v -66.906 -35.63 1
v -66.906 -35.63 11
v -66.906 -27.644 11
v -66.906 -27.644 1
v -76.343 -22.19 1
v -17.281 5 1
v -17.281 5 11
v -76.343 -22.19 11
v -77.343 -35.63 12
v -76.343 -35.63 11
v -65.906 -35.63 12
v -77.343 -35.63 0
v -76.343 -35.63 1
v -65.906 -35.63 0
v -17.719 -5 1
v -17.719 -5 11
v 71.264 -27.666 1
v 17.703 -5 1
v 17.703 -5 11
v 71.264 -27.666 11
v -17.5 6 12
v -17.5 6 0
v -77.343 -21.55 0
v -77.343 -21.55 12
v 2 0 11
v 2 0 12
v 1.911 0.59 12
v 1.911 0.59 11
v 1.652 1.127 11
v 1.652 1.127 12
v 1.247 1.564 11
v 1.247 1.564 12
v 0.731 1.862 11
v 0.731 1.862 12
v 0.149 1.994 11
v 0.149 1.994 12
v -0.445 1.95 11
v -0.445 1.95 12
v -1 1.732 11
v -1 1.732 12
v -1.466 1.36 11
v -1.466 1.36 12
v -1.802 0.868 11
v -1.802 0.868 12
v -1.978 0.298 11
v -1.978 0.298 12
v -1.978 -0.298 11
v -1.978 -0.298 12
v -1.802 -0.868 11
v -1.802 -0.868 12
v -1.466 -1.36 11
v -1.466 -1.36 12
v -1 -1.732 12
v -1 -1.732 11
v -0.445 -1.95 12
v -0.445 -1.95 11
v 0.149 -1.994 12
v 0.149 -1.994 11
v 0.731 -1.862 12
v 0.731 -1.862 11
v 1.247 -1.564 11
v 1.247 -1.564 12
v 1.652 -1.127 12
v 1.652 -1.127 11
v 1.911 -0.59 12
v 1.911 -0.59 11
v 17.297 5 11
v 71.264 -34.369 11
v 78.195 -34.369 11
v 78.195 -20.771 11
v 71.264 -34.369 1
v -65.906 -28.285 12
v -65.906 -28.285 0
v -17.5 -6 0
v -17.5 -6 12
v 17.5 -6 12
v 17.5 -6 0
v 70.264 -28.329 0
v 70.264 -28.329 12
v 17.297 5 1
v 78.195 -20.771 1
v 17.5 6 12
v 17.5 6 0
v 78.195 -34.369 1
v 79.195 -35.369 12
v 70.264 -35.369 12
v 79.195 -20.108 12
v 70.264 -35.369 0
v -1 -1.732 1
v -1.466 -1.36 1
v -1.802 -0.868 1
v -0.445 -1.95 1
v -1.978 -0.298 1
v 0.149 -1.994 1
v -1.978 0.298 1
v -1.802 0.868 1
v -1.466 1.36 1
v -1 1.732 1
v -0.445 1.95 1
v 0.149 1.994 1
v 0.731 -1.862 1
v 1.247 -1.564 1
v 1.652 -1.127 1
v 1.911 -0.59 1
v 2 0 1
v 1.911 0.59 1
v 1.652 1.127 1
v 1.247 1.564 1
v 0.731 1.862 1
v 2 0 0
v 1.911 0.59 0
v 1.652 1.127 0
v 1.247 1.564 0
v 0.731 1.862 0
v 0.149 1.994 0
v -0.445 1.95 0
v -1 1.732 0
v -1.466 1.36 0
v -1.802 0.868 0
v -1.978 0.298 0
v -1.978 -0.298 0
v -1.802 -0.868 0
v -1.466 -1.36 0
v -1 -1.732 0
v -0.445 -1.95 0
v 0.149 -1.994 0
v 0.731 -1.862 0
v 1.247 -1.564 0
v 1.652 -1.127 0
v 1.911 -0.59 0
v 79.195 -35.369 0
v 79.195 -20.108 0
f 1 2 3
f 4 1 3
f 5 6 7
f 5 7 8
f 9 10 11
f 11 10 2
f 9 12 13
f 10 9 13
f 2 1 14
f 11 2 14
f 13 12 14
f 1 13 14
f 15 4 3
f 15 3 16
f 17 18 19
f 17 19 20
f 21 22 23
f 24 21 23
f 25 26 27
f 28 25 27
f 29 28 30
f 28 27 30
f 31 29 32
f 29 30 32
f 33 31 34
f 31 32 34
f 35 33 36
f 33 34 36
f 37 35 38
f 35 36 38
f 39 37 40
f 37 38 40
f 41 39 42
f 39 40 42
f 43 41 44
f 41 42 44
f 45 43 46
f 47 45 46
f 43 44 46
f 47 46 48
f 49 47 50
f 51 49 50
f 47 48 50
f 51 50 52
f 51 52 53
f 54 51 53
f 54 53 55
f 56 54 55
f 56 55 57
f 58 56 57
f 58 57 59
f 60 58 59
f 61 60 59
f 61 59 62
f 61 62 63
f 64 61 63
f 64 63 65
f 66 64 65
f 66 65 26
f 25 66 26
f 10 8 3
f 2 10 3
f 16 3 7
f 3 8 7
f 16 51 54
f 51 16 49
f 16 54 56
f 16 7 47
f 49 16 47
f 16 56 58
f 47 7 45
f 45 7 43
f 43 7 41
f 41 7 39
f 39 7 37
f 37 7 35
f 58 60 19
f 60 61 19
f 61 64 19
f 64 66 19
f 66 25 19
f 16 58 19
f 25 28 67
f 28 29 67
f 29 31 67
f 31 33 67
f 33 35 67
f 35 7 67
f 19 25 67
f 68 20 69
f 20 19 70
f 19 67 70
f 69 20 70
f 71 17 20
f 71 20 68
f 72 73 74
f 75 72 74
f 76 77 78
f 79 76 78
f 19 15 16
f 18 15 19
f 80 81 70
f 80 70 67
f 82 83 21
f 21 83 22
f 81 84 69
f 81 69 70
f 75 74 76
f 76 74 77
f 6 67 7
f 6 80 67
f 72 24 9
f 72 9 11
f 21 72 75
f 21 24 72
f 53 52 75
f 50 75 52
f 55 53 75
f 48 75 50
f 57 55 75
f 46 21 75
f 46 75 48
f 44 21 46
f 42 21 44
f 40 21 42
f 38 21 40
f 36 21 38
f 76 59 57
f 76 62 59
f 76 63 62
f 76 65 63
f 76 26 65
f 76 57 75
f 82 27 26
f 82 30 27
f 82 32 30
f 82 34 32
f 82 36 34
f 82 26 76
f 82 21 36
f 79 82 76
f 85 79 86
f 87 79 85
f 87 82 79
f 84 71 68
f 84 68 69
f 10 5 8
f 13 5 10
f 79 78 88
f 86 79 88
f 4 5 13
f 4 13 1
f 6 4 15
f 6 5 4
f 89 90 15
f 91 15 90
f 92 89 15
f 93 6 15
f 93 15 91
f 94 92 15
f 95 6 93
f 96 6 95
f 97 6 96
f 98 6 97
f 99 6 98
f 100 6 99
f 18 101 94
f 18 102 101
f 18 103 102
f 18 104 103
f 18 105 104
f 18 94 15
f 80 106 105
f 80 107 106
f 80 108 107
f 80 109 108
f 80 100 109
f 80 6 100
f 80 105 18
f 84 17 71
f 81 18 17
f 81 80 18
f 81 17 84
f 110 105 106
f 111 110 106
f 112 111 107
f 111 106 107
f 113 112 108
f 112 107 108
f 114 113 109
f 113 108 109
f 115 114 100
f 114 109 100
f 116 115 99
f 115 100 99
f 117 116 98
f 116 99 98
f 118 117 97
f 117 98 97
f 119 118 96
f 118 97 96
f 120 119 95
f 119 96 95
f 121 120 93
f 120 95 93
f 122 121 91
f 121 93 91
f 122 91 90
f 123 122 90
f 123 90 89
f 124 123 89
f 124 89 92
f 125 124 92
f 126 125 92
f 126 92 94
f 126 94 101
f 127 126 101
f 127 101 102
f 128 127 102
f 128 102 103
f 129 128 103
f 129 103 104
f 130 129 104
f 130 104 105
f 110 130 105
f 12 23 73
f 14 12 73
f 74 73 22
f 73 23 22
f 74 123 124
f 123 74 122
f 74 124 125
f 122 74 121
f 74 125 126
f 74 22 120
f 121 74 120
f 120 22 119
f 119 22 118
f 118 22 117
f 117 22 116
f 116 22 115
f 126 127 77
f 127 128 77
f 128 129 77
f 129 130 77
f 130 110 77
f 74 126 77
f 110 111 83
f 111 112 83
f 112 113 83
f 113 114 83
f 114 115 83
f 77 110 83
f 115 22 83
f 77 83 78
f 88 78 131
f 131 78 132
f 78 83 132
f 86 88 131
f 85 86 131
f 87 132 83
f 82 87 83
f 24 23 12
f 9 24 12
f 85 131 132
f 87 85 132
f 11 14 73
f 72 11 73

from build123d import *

# Parameters (mm, degrees)
BOSS_EXTRUDE1_DEPTH = 12
SHELL1_T            = -1
SKETCH2_W           = 10
SKETCH2_H           = 10
CUT_EXTRUDE1_DEPTH  = 12
SKETCH3_R           = 2
CUT_EXTRUDE2_DEPTH  = 12
SKETCH5_W           = 0.21800788
SKETCH5_H           = 12
CUT_EXTRUDE3_DEPTH  = 1.937482958


with BuildPart() as part:
    # Sketch1 → Boss-Extrude1 (new body)
    with BuildSketch(Plane.XY):
        Polygon((-17.5, 6), (-77.342905627, -21.549973615), (-77.342905627, -35.63), (-65.906288607, -35.63), (-65.906288607, -28.284880053), (-17.5, -6), (17.5, -6), (70.263903397, -28.328632203), (70.263903397, -35.368537604), (79.19497343, -35.368537604), (79.19497343, -20.108083023), (17.5, 6), align=None)
    extrude(amount=BOSS_EXTRUDE1_DEPTH)

    # Shell1
    shell1_openings = [part.faces().sort_by_distance(p)[0] for p in [
        (-71.624597117, -35.63, 6),
    ]]
    offset(amount=SHELL1_T, openings=shell1_openings, kind=Kind.INTERSECTION)

    # Sketch2 → Cut-Extrude1 (cut)
    with BuildSketch(Plane.XZ.offset(35.63)):
        with Locations((89.157094373, 6.101364163)):
            Rectangle(SKETCH2_W, SKETCH2_H)
    extrude(amount=-CUT_EXTRUDE1_DEPTH, mode=Mode.SUBTRACT)

    # Sketch3 → Cut-Extrude2 (cut)
    with BuildSketch(Plane.XY.offset(12)):
        Circle(SKETCH3_R)
    extrude(amount=-CUT_EXTRUDE2_DEPTH, mode=Mode.SUBTRACT)

    # Sketch5 → Cut-Extrude3 (cut)
    with BuildSketch(Plane.XZ.offset(35.63)):
        with Locations((83.048090433, 6)):
            Rectangle(SKETCH5_W, SKETCH5_H)
    extrude(amount=-CUT_EXTRUDE3_DEPTH, mode=Mode.SUBTRACT)


solid = part.part
